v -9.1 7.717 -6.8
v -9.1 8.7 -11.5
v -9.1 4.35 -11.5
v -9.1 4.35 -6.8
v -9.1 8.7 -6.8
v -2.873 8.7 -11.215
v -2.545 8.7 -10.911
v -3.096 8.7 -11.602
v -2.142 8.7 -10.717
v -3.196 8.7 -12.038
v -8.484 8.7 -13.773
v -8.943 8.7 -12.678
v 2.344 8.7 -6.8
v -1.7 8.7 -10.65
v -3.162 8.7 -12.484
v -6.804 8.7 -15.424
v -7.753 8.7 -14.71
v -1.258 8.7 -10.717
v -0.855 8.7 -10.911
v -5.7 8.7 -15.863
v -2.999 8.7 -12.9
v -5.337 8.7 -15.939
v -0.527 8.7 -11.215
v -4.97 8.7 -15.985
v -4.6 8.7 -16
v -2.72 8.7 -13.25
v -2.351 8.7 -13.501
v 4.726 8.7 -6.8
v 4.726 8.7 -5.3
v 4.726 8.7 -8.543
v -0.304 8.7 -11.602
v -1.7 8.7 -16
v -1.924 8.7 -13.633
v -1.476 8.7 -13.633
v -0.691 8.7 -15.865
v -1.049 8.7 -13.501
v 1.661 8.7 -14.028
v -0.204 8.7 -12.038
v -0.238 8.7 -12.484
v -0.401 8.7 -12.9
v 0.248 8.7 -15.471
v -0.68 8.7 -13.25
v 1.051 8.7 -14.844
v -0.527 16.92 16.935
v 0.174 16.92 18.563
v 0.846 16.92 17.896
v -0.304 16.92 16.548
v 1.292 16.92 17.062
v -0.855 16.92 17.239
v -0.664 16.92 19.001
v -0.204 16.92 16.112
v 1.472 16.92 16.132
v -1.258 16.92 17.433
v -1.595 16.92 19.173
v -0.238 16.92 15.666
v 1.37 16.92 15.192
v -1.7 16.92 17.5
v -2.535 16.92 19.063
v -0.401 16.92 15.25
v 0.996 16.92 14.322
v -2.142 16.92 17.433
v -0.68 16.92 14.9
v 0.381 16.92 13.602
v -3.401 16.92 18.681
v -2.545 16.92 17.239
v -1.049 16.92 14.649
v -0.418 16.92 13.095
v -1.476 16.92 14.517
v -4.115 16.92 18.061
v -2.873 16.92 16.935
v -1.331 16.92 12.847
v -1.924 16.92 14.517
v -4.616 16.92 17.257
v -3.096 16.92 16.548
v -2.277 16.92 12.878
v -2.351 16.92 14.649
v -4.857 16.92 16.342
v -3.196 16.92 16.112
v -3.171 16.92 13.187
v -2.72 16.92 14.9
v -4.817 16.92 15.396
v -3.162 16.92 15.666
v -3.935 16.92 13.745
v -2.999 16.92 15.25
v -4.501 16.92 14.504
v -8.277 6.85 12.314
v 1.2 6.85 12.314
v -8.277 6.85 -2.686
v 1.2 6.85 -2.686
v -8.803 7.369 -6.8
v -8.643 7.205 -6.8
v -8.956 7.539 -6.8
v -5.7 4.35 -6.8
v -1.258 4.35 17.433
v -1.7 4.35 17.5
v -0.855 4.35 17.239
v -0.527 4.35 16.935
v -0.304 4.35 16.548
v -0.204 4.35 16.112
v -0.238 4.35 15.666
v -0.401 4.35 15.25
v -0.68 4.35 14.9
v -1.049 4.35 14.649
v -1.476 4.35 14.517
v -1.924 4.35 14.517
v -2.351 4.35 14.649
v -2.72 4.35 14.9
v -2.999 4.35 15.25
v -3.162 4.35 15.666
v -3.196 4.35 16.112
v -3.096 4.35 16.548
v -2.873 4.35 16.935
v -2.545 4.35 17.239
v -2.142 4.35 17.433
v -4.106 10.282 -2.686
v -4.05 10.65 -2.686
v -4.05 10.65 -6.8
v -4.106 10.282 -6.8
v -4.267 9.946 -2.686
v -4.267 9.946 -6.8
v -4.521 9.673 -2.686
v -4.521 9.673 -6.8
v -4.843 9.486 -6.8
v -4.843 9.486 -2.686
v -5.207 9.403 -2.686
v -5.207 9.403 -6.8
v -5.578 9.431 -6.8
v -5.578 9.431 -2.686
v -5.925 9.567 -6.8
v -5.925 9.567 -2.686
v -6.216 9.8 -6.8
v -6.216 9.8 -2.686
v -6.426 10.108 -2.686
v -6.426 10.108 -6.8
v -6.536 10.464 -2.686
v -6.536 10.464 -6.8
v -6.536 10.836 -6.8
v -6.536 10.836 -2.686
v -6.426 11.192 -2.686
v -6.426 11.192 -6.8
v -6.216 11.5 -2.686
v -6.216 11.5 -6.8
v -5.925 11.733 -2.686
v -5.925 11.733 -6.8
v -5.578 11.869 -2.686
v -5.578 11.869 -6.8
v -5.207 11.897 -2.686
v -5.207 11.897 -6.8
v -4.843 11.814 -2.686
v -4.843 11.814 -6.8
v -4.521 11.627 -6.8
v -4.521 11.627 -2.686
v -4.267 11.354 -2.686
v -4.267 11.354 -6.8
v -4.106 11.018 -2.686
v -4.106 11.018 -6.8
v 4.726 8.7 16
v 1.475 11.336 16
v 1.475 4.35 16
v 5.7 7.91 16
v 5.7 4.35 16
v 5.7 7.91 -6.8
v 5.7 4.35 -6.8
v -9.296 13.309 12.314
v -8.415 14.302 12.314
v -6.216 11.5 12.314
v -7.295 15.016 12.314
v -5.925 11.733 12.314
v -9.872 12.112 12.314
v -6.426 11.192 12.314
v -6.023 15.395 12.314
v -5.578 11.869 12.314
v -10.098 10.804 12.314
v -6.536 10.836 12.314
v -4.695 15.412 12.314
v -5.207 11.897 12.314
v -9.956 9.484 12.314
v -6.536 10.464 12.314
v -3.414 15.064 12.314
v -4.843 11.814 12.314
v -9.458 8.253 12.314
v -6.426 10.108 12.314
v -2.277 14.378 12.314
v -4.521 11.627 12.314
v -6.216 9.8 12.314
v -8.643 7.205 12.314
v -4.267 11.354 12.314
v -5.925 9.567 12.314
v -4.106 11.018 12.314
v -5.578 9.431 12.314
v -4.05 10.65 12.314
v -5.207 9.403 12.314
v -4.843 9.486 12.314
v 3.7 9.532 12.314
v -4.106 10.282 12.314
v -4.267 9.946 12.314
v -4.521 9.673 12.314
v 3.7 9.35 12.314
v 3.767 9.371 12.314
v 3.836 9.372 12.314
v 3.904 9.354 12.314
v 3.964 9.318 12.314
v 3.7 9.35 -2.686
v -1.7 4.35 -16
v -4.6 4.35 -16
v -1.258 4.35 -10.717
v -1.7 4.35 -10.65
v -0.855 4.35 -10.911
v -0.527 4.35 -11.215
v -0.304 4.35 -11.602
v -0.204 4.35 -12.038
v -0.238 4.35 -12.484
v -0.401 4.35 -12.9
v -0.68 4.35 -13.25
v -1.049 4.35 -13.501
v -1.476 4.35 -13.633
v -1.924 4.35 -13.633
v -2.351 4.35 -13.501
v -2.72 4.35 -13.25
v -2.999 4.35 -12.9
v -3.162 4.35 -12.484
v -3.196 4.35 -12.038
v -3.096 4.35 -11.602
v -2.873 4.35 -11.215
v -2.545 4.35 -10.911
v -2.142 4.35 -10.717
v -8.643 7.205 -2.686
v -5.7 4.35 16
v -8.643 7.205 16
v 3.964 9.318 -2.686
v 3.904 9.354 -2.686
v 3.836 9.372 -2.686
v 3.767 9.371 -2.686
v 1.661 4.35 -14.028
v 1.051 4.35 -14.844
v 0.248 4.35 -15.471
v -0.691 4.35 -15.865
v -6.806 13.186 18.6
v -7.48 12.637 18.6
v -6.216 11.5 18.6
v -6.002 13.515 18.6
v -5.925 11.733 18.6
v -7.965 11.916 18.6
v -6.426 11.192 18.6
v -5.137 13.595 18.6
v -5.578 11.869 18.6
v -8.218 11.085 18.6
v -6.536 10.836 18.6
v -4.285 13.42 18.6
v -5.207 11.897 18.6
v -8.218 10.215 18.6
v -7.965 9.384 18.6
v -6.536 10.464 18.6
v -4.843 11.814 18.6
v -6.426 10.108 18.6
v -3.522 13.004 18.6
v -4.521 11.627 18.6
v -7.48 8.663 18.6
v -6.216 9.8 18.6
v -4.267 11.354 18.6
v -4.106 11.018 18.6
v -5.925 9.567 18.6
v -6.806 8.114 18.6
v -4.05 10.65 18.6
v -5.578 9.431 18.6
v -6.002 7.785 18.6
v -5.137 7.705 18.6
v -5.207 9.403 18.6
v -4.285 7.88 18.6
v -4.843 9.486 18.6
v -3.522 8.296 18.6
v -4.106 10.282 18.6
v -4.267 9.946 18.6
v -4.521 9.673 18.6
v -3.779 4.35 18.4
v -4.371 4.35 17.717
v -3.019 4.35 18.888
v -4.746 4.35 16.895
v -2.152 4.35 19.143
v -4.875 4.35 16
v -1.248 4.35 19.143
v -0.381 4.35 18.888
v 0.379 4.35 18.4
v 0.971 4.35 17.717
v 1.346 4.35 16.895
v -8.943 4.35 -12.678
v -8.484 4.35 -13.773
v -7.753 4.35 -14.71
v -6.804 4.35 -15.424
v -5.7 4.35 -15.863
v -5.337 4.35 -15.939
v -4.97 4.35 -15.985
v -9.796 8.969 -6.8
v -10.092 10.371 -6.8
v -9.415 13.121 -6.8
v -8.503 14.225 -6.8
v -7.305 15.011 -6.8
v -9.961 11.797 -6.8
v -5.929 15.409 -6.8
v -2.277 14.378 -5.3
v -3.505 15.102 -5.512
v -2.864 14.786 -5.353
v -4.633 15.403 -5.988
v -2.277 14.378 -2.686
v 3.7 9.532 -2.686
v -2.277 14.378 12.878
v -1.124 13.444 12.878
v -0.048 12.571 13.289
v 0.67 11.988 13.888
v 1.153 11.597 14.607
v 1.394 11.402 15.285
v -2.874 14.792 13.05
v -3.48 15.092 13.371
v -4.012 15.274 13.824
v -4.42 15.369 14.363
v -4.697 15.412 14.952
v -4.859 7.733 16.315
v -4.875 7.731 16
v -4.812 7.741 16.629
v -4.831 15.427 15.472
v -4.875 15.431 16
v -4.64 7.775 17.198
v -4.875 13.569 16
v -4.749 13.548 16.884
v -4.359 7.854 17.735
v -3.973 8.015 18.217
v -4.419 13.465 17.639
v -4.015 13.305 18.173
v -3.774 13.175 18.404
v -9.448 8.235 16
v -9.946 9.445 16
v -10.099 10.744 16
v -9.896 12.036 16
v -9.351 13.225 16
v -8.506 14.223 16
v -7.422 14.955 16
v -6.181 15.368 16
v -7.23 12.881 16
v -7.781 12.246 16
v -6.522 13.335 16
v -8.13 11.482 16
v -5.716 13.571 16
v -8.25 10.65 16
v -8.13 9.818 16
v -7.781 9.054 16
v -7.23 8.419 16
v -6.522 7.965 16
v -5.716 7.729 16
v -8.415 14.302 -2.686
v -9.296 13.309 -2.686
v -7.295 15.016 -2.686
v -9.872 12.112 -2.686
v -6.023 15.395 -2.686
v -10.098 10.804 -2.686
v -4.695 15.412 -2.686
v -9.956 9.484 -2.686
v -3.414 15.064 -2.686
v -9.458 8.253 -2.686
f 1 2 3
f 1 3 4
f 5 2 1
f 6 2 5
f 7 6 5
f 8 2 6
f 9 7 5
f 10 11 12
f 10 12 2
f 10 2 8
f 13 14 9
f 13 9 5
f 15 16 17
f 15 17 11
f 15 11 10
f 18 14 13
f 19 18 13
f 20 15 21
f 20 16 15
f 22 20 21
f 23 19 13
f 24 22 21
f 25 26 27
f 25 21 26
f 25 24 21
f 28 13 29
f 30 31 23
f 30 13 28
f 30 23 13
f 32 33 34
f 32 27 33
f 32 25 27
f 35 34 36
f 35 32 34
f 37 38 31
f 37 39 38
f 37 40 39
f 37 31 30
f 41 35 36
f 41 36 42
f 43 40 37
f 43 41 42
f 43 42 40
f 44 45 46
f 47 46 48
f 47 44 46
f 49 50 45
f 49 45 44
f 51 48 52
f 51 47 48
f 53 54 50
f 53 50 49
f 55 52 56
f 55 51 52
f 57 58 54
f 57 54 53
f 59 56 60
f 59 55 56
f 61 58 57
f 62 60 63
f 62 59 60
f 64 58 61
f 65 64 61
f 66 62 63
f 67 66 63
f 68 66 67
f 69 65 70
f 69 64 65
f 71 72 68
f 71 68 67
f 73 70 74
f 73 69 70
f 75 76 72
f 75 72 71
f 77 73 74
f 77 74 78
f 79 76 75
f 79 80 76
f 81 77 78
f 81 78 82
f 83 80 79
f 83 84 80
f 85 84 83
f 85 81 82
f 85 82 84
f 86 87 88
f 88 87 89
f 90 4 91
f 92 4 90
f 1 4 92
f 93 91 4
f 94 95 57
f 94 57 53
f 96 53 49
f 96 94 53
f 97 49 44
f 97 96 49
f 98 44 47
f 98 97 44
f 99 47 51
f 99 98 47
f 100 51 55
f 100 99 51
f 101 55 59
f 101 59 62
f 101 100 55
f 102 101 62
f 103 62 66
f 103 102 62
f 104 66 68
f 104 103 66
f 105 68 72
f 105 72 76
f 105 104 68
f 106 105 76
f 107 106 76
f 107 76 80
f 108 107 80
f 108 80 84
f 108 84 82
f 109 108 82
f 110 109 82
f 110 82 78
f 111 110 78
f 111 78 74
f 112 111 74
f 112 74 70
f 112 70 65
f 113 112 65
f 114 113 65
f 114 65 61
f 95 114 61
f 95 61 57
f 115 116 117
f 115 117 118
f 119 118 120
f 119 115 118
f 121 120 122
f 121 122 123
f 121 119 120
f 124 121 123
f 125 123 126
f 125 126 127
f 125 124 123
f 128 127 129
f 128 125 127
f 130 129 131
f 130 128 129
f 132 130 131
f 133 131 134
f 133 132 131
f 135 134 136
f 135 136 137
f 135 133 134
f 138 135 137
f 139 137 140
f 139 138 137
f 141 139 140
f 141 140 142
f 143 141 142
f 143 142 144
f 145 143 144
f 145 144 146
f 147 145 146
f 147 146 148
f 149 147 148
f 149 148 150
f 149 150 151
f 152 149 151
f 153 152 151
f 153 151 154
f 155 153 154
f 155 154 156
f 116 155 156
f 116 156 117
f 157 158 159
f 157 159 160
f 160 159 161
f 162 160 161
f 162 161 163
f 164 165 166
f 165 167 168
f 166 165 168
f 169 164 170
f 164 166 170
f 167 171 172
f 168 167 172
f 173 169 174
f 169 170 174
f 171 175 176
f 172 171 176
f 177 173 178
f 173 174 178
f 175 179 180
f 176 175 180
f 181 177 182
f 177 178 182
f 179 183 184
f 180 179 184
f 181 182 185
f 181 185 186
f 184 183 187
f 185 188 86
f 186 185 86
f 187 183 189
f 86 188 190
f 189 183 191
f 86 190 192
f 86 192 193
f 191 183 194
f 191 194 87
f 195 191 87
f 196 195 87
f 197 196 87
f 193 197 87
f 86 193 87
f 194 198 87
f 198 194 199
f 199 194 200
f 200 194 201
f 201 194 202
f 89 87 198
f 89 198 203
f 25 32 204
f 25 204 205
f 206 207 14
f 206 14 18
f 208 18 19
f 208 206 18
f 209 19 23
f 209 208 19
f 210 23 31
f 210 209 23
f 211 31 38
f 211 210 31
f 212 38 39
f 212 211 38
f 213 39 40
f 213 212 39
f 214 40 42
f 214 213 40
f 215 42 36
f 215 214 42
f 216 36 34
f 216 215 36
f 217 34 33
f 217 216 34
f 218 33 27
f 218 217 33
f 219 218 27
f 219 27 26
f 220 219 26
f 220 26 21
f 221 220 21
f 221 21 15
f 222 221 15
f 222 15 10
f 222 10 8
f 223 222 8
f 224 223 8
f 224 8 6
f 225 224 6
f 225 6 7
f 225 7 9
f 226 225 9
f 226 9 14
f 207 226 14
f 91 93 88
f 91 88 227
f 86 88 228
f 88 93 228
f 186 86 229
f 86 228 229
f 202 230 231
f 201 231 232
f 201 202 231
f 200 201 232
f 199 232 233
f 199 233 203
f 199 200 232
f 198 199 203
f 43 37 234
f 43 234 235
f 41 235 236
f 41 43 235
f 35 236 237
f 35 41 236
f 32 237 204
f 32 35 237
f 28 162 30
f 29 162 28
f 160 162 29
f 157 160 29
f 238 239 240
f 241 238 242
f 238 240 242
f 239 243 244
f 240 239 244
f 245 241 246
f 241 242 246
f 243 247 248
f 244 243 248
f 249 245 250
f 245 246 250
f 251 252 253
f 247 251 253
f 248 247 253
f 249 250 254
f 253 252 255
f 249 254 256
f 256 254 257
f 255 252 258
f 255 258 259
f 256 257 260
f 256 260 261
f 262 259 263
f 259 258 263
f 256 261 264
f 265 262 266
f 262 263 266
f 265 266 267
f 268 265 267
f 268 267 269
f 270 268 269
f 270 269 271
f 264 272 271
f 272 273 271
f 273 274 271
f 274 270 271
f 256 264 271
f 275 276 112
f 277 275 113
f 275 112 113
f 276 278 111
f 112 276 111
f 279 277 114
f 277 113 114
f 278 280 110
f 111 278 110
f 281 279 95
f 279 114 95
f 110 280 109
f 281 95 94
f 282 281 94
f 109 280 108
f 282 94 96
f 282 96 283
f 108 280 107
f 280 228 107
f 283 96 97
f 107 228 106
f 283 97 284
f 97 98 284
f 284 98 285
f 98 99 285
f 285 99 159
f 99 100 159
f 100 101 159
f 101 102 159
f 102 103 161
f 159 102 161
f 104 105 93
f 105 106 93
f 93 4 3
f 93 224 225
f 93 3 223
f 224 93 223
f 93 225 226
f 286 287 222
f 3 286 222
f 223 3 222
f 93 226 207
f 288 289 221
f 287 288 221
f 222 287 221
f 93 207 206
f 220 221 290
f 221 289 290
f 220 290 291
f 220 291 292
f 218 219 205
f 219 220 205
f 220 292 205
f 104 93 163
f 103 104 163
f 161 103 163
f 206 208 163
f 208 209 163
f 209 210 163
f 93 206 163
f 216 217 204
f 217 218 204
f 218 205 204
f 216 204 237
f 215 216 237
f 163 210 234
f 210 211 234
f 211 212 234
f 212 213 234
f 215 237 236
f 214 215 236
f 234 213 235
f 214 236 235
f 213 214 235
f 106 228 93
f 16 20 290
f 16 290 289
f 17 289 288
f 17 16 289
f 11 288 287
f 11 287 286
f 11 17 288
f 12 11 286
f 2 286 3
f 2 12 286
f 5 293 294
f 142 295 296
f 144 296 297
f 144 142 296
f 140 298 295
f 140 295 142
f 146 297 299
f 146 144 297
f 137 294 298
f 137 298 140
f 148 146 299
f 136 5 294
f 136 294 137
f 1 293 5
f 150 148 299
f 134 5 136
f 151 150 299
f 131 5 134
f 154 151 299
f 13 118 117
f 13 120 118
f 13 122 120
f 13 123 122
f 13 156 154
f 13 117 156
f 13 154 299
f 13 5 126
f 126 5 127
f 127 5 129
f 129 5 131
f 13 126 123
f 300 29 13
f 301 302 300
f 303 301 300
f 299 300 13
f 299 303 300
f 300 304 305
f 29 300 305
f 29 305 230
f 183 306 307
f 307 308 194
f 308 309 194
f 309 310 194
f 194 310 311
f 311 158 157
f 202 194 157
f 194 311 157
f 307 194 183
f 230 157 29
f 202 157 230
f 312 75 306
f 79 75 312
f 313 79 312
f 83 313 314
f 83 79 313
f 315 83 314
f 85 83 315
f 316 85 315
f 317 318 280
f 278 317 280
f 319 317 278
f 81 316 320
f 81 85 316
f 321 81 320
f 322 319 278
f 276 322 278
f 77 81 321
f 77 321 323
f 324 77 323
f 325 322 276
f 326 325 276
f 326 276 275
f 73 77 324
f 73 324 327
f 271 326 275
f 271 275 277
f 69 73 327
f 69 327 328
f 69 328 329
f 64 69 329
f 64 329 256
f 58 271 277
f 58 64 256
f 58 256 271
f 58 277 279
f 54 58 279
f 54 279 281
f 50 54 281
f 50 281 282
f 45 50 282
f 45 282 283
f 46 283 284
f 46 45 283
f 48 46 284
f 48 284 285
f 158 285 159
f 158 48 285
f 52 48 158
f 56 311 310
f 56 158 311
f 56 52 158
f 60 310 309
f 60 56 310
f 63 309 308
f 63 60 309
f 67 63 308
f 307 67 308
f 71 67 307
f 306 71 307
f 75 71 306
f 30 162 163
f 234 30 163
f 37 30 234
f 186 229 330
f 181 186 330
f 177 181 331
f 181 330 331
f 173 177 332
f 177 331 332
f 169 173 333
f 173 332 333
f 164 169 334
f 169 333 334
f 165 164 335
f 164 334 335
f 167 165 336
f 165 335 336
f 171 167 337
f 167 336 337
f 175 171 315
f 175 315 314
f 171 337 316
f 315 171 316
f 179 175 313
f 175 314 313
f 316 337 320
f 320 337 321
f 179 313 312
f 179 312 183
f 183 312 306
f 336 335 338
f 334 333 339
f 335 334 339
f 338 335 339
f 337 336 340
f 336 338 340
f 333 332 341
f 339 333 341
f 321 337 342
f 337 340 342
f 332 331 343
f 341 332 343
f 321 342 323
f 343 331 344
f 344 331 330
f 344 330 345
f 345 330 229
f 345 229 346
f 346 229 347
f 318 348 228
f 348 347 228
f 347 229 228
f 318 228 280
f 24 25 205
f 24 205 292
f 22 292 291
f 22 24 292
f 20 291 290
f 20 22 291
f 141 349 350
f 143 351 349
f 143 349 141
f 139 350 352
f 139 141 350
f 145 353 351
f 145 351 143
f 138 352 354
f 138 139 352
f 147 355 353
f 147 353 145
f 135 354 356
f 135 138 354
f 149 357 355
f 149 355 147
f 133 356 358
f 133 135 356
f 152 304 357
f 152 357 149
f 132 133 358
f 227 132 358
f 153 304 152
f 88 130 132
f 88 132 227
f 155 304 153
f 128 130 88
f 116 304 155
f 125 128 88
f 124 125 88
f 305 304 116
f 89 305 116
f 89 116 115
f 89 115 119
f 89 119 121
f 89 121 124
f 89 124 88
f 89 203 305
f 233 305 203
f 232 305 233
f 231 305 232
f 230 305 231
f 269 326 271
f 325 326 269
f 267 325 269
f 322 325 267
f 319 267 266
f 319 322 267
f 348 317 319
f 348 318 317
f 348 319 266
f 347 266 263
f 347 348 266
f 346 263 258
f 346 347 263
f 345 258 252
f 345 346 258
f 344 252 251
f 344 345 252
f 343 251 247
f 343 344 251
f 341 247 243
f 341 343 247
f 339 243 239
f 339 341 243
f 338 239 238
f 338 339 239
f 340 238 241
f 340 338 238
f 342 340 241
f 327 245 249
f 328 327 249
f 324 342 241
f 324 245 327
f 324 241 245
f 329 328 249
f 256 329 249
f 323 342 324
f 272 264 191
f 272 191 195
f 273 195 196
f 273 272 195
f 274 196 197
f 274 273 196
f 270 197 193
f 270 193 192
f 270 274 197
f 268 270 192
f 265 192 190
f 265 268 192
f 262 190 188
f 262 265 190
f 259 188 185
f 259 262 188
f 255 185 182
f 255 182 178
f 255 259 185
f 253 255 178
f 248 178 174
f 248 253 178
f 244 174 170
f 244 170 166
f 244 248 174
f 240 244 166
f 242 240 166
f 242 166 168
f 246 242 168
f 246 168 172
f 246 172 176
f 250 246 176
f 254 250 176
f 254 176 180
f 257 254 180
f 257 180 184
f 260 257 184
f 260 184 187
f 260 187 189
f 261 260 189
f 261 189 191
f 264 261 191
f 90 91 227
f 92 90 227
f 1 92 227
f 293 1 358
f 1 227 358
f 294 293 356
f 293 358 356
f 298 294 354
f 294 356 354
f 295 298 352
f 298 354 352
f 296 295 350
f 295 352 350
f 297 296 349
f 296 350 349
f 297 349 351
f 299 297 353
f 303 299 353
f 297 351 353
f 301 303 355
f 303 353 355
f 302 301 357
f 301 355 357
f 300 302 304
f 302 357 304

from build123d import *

# Parameters (mm, degrees)
BOSS_EXTRUDE1_DEPTH = 4.35
BOSS_EXTRUDE2_DEPTH = 22.8
CUT_EXTRUDE1_DEPTH  = 35.228241264
BOSS_EXTRUDE3_START = -12.57
SKETCH5_R           = 3.175
BOSS_EXTRUDE3_DEPTH = 12.57
SKETCH6_R           = 2.95
BOSS_EXTRUDE4_DEPTH = 2.6
CHAMFER1_SIZE       = 1.5
SKETCH7_R           = 1.5
CUT_EXTRUDE2_DEPTH  = 26.053852665
SKETCH8_R           = 1.25
CUT_EXTRUDE3_DEPTH  = 37.969425255
SKETCH9_W           = 15
SKETCH9_H           = 8.6
CUT_EXTRUDE4_DEPTH  = 25.4
CHAMFER2_SIZE       = 2.5
FILLET1_R           = 0.25


with BuildPart() as part:
    # Sketch2 → Boss-Extrude1 (new body)
    with BuildSketch(Plane(origin=(0, 0, 0), x_dir=(1, 0, 0), z_dir=(0, 1, 0))):
        with BuildLine():
            ThreePointArc((1.475, -16), (-1.7, -12.825), (-4.875, -16))
            Line((-4.875, -16), (1.475, -16))
        make_face()
        with BuildLine():
            Line((1.475, -16), (-4.875, -16))
            ThreePointArc((-4.875, -16), (-1.7, -19.175), (1.475, -16))
        make_face()
        with BuildLine():
            Line((-5.7, 15.863484846), (-5.7, 6.8))
            Line((-5.7, 6.8), (-5.7, -16))
            Line((-5.7, -16), (-4.875, -16))
            ThreePointArc((-4.875, -16), (-1.7, -12.825), (1.475, -16))
            Line((1.475, -16), (5.7, -16))
            Line((5.7, -16), (5.7, 6.8))
            Line((5.7, 6.8), (1.660846582, 14.02808686))
            ThreePointArc((1.660846582, 14.02808686), (0.248315373, 15.470627532), (-1.7, 16))
            Line((-1.7, 16), (-4.6, 16))
            ThreePointArc((-4.6, 16), (-5.154219358, 15.965740801), (-5.7, 15.863484846))
        make_face()
        with BuildLine():
            Line((-9.1, 6.8), (-5.7, 6.8))
            Line((-5.7, 6.8), (-5.7, 15.863484846))
            ThreePointArc((-5.7, 15.863484846), (-8.14964787, 14.265863337), (-9.1, 11.5))
            Line((-9.1, 11.5), (-9.1, 6.8))
        make_face()
    extrude(amount=BOSS_EXTRUDE1_DEPTH)

    # Sketch3 → Boss-Extrude2 (add)
    with BuildSketch(Plane.XY.offset(16)):
        with BuildLine():
            Line((5.7, 0.79), (-4.875, 4.092368421))
            Line((-4.875, 4.092368421), (-4.875, 2.831147875))
            ThreePointArc((-4.875, 2.831147875), (-1.758813758, 1.290370349), (-0.5, -1.95))
            ThreePointArc((-0.5, -1.95), (-0.966901247, -4.015007311), (-2.276772998, -5.678283585))
            Line((-2.276772998, -5.678283585), (5.7, 0.79))
        make_face()
        with BuildLine():
            ThreePointArc((-5.7, 2.833304297), (-7.287324911, 2.419272216), (-8.642534504, 1.494918444))
            ThreePointArc((-8.642534504, 1.494918444), (-8.890152665, -5.136032618), (-2.276772998, -5.678283585))
            ThreePointArc((-2.276772998, -5.678283585), (-0.966901247, -4.015007311), (-0.5, -1.95))
            ThreePointArc((-0.5, -1.95), (-1.758813758, 1.290370349), (-4.875, 2.831147875))
            Line((-4.875, 2.831147875), (-4.875, 0))
            Line((-4.875, 0), (-5.7, 0))
            Line((-5.7, 0), (-5.7, 2.833304297))
        make_face()
        with BuildLine():
            ThreePointArc((-4.875, 2.831147875), (-5.287453585, 2.849983603), (-5.7, 2.833304297))
            Line((-5.7, 2.833304297), (-5.7, 0))
            Line((-5.7, 0), (-4.875, 0))
            Line((-4.875, 0), (-4.875, 2.831147875))
        make_face()
        with BuildLine():
            Line((-4.875, 4.092368421), (-5.7, 4.35))
            Line((-5.7, 4.35), (-5.7, 2.833304297))
            ThreePointArc((-5.7, 2.833304297), (-5.287453585, 2.849983603), (-4.875, 2.831147875))
            Line((-4.875, 2.831147875), (-4.875, 4.092368421))
        make_face()
        with BuildLine():
            Line((-5.7, 2.833304297), (-5.7, 4.35))
            Line((-5.7, 4.35), (-8.642534504, 1.494918444))
            ThreePointArc((-8.642534504, 1.494918444), (-7.287324911, 2.419272216), (-5.7, 2.833304297))
        make_face()
    extrude(amount=-BOSS_EXTRUDE2_DEPTH)

    # Sketch4 → Cut-Extrude1 (cut, through all)
    with BuildSketch(Plane.XY.offset(16)):
        Polygon((5.7, 0), (5.7, 0.79), (4.725761535, 0), align=None)
    extrude(amount=-CUT_EXTRUDE1_DEPTH, mode=Mode.SUBTRACT)

    # Sketch5 → Boss-Extrude3 (add)
    with BuildSketch(Plane(origin=(0, 4.35, 0), x_dir=(1, 0, 0), z_dir=(0, 1, 0)).offset(BOSS_EXTRUDE3_START)):
        with Locations(Location((-1.7, -16, 0), (0, 0, 100.46651796))):
            Circle(SKETCH5_R)
    extrude(amount=BOSS_EXTRUDE3_DEPTH)

    # Sketch6 → Boss-Extrude4 (add)
    with BuildSketch(Plane.XY.offset(16)):
        with Locations((-5.3, -1.95)):
            Circle(SKETCH6_R)
    extrude(amount=BOSS_EXTRUDE4_DEPTH)

    # Chamfer1
    # the kernel refuses this chamfer: 1.5 mm, written as the material it takes off along each edge
    with BuildSketch(Plane(origin=(-5.273011582, -8.107902789, -6.8), x_dir=(0.017317974295388713, -0.021356755298707605, 0.9996219169112968), z_dir=(0.7767257469610731, 0.6298389587884852, 0))) as chamfer1_piece_1_section:
        Polygon((CHAMFER1_SIZE * 0.999621916911, -CHAMFER1_SIZE * 0.0274958766106), (-CHAMFER1_SIZE * 0.0274958766106, -CHAMFER1_SIZE * 0.999621916911), (0, 0), align=None)
    chamfer1_piece_1 = extrude(amount=16.730502051, mode=Mode.PRIVATE)
    chamfer1_piece_1 = split(chamfer1_piece_1, bisect_by=Plane(origin=(-2.677352376, 0, -6.368001428), z_dir=(0, -1, 0)), keep=Keep.TOP, mode=Mode.PRIVATE)
    add(chamfer1_piece_1, mode=Mode.SUBTRACT)

    # Sketch7 → Cut-Extrude2 (cut, through all)
    with BuildSketch(Plane(origin=(0, 4.35, 0), x_dir=(1, 0, 0), z_dir=(0, 1, 0))):
        with Locations(Location((-1.7, 12.15, 0), (0, 0, 270))):
            Circle(SKETCH7_R)
        with Locations(Location((-1.7, -16, 0), (0, 0, 270))):
            Circle(SKETCH7_R)
    extrude(amount=-CUT_EXTRUDE2_DEPTH, mode=Mode.SUBTRACT)

    # Sketch8 → Cut-Extrude3 (cut, through all)
    with BuildSketch(Plane.XY.offset(18.6)):
        with Locations((-5.3, -1.95)):
            Circle(SKETCH8_R)
    extrude(amount=-CUT_EXTRUDE3_DEPTH, mode=Mode.SUBTRACT)

    # Sketch9 → Cut-Extrude4 (cut)
    with BuildSketch(Plane(origin=(3.7, 0, 0), x_dir=(0, 0, -1), z_dir=(1, 0, 0))):
        with Locations((-4.814141793, -2.45)):
            Rectangle(SKETCH9_W, SKETCH9_H)
    extrude(amount=-CUT_EXTRUDE4_DEPTH, mode=Mode.SUBTRACT)

    # Chamfer2
    chamfer2_edges = [part.edges().sort_by_distance(p)[0] for p in [
        (3.7, 1.85, 4.814141793),
    ]]
    chamfer(chamfer2_edges, length=CHAMFER2_SIZE)

    # Fillet1
    # the kernel refuses this fillet: 0.25 mm, written as the material it takes off along each edge
    with BuildSketch(Plane(origin=(3.7, -0.831779531, 12.314141793), x_dir=(0, 1, 0), z_dir=(0, 0, -1))) as fillet1_piece_1:
        with BuildLine():
            CenterArc((0.408056999, 0.106294437), FILLET1_R, 140.961757793, 64.20015701)
            Line((0.213875562, 0.263754177), (0, 0))
            Line((0, 0), (0.181779531, 0))
        make_face()
    extrude(amount=15, mode=Mode.SUBTRACT)


with BuildPart() as body_2:
    # Mirror1: mirrored copy
    add(part.part.mirror(Plane.ZX.offset(4.35)))


solid = body_2.part
